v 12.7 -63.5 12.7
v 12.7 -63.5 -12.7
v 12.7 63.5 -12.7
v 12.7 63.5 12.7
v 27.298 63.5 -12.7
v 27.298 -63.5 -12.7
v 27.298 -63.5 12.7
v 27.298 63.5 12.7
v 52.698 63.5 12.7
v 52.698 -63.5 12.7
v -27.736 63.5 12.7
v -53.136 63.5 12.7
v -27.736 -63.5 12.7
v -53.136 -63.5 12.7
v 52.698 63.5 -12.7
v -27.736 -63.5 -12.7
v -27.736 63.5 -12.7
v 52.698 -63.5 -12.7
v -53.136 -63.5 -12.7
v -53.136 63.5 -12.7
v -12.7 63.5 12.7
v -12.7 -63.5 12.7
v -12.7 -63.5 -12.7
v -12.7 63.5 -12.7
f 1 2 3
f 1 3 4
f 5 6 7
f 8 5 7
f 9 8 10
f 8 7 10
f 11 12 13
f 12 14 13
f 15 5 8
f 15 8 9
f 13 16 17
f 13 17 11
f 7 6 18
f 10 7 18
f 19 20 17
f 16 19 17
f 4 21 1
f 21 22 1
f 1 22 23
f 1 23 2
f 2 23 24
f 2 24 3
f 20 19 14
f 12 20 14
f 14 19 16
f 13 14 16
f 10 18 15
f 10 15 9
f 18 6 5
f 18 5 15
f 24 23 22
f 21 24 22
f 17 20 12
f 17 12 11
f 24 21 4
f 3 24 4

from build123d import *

# Parameters (mm, degrees)
F0_W     = 25.4
F0_H     = 25.4
F1_DEPTH = 63.5
F2_DEPTH = 63.5
F3_DEPTH = 63.5


with BuildPart() as f1:
    # F0 (on Front) → F1 (new body, symmetric)
    with BuildSketch(Plane.XZ):
        with Locations((-40.435629, 0)):
            Rectangle(F0_W, F0_H)
    extrude(amount=F1_DEPTH, both=True)


with BuildPart() as f2:
    # F0 (on Front) → F2 (new body, symmetric)
    with BuildSketch(Plane.XZ):
        Rectangle(F0_W, F0_H)
    extrude(amount=F2_DEPTH, both=True)


with BuildPart() as f3:
    # F0 (on Front) → F3 (new body, symmetric)
    with BuildSketch(Plane.XZ):
        with Locations((39.997695, 0)):
            Rectangle(F0_W, F0_H)
    extrude(amount=F3_DEPTH, both=True)


solid = Compound([f1.part, f2.part, f3.part])
